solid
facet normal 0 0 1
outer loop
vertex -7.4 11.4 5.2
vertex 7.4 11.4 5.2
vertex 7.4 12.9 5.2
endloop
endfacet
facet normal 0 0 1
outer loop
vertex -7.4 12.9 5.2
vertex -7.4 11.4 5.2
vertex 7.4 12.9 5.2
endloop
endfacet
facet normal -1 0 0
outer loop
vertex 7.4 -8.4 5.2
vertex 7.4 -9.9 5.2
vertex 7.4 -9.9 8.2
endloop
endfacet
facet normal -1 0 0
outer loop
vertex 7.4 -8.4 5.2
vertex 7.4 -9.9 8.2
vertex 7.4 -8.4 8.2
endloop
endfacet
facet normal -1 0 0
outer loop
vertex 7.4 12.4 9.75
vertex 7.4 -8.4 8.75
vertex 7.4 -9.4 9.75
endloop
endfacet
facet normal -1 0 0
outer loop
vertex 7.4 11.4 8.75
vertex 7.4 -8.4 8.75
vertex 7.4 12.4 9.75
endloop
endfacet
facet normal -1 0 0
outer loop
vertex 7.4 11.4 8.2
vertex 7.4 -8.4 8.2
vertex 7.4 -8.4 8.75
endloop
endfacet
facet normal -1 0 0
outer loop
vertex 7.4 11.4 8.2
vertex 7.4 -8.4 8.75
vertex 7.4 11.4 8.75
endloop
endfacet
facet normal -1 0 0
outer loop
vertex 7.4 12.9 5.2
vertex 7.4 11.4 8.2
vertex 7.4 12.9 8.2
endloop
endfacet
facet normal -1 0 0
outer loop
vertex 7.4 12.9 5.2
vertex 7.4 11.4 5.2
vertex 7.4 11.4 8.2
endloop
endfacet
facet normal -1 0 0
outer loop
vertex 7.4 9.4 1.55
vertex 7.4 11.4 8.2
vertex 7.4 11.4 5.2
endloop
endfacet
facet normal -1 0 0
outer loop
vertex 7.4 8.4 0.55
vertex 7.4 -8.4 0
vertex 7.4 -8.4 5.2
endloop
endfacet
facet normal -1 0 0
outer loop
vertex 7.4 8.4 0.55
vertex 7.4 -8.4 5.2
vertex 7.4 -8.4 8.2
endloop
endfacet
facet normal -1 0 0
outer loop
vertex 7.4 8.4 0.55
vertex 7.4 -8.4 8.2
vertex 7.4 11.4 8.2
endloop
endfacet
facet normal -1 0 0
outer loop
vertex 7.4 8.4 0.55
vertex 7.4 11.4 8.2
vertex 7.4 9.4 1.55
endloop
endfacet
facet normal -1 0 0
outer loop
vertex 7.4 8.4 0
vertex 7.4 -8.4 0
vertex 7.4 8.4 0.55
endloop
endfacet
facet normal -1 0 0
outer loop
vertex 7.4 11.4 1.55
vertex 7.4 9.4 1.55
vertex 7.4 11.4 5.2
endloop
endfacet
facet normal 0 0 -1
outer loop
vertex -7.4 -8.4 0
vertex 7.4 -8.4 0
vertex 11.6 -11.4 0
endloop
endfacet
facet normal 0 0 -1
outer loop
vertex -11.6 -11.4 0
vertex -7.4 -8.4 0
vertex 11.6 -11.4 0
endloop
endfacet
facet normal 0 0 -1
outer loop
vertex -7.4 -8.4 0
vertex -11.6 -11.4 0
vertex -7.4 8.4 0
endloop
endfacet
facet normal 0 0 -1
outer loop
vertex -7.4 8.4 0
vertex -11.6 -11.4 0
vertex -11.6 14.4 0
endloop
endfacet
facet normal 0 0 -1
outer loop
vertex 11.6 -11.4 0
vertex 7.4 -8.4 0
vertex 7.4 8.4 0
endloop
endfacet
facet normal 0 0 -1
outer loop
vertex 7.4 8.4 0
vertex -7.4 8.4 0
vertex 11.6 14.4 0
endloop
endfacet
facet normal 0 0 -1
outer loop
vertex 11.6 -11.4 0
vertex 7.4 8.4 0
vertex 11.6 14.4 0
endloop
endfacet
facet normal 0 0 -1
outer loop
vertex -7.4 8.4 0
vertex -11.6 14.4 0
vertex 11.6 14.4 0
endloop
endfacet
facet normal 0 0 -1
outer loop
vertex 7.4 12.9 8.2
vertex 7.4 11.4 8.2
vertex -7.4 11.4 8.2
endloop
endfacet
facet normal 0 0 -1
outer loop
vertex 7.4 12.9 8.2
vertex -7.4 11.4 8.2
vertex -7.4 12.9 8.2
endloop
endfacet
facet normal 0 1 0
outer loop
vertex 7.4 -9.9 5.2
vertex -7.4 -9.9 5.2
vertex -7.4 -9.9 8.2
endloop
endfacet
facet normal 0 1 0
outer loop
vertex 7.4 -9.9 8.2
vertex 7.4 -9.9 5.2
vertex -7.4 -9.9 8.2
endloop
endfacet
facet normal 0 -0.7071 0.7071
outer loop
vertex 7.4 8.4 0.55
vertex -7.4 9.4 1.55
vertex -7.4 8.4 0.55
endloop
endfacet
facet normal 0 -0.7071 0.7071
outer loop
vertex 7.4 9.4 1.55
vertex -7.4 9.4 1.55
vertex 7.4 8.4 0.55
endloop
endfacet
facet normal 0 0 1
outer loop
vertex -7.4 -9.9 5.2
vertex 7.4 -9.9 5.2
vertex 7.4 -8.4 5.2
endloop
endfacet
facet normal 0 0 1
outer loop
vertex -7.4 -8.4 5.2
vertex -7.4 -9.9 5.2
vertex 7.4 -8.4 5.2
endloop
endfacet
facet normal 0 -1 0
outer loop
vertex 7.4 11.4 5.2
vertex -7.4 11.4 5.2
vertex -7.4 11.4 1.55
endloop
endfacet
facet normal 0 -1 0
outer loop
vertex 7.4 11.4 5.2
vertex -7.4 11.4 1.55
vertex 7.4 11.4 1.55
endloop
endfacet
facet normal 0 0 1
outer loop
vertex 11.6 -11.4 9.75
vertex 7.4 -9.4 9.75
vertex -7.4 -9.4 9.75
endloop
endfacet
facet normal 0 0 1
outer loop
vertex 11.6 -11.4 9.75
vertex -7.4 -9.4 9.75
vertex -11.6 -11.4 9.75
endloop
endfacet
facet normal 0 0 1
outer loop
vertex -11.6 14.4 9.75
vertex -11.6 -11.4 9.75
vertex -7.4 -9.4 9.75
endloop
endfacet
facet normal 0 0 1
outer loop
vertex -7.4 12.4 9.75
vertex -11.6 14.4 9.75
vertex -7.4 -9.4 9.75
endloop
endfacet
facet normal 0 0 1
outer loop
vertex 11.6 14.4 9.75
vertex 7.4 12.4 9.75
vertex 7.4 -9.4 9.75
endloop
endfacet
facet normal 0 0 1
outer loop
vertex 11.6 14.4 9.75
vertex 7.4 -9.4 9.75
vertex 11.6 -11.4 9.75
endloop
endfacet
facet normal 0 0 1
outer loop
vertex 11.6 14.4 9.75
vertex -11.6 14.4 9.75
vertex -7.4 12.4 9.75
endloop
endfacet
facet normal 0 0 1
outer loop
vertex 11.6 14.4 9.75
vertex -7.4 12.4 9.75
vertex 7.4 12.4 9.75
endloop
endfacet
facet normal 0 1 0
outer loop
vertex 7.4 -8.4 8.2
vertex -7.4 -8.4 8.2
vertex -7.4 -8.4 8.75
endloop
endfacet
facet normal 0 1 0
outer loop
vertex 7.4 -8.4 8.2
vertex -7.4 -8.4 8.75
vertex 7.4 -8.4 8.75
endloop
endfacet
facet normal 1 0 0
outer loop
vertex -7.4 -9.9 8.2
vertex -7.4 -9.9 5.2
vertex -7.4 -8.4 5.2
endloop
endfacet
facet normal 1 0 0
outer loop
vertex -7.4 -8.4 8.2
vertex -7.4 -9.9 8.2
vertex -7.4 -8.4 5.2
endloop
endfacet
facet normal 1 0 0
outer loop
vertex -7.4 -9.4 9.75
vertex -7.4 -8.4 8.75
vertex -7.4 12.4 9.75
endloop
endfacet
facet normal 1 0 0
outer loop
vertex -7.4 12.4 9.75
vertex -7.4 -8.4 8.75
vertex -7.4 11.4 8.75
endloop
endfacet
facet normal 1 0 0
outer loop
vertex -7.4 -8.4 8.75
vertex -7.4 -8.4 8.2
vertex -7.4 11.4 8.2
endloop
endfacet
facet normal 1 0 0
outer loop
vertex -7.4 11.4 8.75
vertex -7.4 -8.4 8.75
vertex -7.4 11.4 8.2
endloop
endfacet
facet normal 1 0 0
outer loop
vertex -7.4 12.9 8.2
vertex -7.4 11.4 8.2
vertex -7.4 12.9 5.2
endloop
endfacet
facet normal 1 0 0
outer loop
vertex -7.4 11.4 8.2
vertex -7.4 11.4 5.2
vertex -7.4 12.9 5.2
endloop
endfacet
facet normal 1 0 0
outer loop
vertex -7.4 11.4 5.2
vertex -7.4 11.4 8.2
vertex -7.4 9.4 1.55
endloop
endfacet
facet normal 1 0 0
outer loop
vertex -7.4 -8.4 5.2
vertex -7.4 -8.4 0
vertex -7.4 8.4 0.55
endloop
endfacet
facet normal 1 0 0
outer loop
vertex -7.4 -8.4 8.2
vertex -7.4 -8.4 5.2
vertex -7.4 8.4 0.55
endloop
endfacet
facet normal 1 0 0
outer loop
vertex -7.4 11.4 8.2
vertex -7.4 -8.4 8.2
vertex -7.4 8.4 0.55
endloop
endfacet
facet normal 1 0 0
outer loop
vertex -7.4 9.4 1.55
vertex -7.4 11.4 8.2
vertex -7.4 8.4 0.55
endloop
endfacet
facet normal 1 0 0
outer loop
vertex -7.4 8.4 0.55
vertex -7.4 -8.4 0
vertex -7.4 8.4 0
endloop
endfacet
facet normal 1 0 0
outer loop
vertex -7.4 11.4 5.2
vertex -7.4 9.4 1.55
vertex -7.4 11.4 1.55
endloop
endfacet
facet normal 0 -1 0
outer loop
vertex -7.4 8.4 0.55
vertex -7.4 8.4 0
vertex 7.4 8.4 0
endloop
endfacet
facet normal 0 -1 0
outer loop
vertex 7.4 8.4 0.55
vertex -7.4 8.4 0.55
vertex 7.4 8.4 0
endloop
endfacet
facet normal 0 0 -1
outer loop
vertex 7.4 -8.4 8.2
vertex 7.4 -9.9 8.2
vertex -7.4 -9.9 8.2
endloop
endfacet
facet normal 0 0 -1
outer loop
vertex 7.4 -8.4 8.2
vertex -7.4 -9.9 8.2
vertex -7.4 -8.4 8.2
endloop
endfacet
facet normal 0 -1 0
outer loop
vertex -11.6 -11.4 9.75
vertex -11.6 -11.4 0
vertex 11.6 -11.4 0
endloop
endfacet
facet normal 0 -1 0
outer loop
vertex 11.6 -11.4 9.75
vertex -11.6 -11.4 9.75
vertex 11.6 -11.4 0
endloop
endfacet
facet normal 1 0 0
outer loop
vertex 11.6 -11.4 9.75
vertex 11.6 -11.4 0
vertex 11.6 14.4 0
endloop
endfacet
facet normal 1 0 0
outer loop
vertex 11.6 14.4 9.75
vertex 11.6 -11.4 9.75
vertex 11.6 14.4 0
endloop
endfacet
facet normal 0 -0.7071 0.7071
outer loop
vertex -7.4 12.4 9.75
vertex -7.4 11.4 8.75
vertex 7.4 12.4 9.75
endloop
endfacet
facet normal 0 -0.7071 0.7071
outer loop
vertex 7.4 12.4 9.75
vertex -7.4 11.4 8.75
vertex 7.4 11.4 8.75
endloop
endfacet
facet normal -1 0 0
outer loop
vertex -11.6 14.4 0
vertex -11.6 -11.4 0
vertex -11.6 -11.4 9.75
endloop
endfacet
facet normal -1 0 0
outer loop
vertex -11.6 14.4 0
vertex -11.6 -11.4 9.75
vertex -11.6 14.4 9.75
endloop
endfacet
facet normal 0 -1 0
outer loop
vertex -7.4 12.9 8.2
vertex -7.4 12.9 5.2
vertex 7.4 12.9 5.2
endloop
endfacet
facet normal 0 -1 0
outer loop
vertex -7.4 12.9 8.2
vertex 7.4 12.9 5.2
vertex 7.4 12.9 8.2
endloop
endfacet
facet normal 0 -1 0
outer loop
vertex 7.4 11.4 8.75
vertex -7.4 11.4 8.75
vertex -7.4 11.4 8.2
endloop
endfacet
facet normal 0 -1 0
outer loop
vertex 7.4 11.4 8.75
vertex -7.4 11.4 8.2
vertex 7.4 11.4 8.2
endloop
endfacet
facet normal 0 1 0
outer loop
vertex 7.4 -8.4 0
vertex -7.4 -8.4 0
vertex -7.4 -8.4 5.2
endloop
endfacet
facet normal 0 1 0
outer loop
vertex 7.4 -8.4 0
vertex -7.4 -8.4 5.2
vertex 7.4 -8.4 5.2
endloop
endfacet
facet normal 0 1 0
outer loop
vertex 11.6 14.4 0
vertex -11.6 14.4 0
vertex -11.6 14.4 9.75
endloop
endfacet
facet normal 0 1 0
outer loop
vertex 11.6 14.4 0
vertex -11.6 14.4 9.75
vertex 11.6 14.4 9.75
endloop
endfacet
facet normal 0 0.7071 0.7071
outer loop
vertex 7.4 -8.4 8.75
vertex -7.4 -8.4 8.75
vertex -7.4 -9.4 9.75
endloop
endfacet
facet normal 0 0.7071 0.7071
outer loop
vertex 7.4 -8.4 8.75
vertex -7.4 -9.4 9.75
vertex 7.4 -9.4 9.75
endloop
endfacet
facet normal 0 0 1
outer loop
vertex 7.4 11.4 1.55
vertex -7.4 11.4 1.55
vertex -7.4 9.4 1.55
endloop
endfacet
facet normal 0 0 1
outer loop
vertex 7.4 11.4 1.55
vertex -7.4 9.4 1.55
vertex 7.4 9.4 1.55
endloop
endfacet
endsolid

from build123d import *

# Parameters (mm, degrees)
SKETCH_W        = 23.2
SKETCH_H        = 25.8
SKETCH_W_2      = 14.8
SKETCH_H_2      = 16.8
PAD_DEPTH       = 9.75
SKETCH001_W     = 14.8
SKETCH001_H     = 19.8
POCKET_DEPTH    = 8.2
POCKET001_START = -4.2
SKETCH002_W     = 1.5
SKETCH002_H     = 3
POCKET001_DEPTH = 14.8
CHAMFER_SIZE    = 1


with BuildPart() as part:
    # Sketch → Pad (new body)
    with BuildSketch(Plane.XY):
        with Locations((0, 1.5)):
            Rectangle(SKETCH_W, SKETCH_H)
        Rectangle(SKETCH_W_2, SKETCH_H_2, mode=Mode.SUBTRACT)
    extrude(amount=PAD_DEPTH)

    # Sketch001 (on Face10 of Pad) → Pocket (cut)
    with BuildSketch(Plane.XY.offset(9.75)):
        with Locations((0, 1.5)):
            Rectangle(SKETCH001_W, SKETCH001_H)
    extrude(amount=-POCKET_DEPTH, mode=Mode.SUBTRACT)

    # Sketch002 (on Face6 of Pocket) → Pocket001 (cut)
    with BuildSketch(Plane.YZ.offset(11.6).offset(POCKET001_START)):
        with Locations((-9.15, 6.7)):
            Rectangle(SKETCH002_W, SKETCH002_H)
        with Locations((12.15, 6.7)):
            Rectangle(SKETCH002_W, SKETCH002_H)
    extrude(amount=-POCKET001_DEPTH, mode=Mode.SUBTRACT)

    # Chamfer
    chamfer_edges = [part.edges().sort_by_distance(p)[0] for p in [
        (0, 8.4, 1.55),
        (0, 11.4, 9.75),
        (0, -8.4, 9.75),
    ]]
    chamfer(chamfer_edges, length=CHAMFER_SIZE)


solid = part.part
